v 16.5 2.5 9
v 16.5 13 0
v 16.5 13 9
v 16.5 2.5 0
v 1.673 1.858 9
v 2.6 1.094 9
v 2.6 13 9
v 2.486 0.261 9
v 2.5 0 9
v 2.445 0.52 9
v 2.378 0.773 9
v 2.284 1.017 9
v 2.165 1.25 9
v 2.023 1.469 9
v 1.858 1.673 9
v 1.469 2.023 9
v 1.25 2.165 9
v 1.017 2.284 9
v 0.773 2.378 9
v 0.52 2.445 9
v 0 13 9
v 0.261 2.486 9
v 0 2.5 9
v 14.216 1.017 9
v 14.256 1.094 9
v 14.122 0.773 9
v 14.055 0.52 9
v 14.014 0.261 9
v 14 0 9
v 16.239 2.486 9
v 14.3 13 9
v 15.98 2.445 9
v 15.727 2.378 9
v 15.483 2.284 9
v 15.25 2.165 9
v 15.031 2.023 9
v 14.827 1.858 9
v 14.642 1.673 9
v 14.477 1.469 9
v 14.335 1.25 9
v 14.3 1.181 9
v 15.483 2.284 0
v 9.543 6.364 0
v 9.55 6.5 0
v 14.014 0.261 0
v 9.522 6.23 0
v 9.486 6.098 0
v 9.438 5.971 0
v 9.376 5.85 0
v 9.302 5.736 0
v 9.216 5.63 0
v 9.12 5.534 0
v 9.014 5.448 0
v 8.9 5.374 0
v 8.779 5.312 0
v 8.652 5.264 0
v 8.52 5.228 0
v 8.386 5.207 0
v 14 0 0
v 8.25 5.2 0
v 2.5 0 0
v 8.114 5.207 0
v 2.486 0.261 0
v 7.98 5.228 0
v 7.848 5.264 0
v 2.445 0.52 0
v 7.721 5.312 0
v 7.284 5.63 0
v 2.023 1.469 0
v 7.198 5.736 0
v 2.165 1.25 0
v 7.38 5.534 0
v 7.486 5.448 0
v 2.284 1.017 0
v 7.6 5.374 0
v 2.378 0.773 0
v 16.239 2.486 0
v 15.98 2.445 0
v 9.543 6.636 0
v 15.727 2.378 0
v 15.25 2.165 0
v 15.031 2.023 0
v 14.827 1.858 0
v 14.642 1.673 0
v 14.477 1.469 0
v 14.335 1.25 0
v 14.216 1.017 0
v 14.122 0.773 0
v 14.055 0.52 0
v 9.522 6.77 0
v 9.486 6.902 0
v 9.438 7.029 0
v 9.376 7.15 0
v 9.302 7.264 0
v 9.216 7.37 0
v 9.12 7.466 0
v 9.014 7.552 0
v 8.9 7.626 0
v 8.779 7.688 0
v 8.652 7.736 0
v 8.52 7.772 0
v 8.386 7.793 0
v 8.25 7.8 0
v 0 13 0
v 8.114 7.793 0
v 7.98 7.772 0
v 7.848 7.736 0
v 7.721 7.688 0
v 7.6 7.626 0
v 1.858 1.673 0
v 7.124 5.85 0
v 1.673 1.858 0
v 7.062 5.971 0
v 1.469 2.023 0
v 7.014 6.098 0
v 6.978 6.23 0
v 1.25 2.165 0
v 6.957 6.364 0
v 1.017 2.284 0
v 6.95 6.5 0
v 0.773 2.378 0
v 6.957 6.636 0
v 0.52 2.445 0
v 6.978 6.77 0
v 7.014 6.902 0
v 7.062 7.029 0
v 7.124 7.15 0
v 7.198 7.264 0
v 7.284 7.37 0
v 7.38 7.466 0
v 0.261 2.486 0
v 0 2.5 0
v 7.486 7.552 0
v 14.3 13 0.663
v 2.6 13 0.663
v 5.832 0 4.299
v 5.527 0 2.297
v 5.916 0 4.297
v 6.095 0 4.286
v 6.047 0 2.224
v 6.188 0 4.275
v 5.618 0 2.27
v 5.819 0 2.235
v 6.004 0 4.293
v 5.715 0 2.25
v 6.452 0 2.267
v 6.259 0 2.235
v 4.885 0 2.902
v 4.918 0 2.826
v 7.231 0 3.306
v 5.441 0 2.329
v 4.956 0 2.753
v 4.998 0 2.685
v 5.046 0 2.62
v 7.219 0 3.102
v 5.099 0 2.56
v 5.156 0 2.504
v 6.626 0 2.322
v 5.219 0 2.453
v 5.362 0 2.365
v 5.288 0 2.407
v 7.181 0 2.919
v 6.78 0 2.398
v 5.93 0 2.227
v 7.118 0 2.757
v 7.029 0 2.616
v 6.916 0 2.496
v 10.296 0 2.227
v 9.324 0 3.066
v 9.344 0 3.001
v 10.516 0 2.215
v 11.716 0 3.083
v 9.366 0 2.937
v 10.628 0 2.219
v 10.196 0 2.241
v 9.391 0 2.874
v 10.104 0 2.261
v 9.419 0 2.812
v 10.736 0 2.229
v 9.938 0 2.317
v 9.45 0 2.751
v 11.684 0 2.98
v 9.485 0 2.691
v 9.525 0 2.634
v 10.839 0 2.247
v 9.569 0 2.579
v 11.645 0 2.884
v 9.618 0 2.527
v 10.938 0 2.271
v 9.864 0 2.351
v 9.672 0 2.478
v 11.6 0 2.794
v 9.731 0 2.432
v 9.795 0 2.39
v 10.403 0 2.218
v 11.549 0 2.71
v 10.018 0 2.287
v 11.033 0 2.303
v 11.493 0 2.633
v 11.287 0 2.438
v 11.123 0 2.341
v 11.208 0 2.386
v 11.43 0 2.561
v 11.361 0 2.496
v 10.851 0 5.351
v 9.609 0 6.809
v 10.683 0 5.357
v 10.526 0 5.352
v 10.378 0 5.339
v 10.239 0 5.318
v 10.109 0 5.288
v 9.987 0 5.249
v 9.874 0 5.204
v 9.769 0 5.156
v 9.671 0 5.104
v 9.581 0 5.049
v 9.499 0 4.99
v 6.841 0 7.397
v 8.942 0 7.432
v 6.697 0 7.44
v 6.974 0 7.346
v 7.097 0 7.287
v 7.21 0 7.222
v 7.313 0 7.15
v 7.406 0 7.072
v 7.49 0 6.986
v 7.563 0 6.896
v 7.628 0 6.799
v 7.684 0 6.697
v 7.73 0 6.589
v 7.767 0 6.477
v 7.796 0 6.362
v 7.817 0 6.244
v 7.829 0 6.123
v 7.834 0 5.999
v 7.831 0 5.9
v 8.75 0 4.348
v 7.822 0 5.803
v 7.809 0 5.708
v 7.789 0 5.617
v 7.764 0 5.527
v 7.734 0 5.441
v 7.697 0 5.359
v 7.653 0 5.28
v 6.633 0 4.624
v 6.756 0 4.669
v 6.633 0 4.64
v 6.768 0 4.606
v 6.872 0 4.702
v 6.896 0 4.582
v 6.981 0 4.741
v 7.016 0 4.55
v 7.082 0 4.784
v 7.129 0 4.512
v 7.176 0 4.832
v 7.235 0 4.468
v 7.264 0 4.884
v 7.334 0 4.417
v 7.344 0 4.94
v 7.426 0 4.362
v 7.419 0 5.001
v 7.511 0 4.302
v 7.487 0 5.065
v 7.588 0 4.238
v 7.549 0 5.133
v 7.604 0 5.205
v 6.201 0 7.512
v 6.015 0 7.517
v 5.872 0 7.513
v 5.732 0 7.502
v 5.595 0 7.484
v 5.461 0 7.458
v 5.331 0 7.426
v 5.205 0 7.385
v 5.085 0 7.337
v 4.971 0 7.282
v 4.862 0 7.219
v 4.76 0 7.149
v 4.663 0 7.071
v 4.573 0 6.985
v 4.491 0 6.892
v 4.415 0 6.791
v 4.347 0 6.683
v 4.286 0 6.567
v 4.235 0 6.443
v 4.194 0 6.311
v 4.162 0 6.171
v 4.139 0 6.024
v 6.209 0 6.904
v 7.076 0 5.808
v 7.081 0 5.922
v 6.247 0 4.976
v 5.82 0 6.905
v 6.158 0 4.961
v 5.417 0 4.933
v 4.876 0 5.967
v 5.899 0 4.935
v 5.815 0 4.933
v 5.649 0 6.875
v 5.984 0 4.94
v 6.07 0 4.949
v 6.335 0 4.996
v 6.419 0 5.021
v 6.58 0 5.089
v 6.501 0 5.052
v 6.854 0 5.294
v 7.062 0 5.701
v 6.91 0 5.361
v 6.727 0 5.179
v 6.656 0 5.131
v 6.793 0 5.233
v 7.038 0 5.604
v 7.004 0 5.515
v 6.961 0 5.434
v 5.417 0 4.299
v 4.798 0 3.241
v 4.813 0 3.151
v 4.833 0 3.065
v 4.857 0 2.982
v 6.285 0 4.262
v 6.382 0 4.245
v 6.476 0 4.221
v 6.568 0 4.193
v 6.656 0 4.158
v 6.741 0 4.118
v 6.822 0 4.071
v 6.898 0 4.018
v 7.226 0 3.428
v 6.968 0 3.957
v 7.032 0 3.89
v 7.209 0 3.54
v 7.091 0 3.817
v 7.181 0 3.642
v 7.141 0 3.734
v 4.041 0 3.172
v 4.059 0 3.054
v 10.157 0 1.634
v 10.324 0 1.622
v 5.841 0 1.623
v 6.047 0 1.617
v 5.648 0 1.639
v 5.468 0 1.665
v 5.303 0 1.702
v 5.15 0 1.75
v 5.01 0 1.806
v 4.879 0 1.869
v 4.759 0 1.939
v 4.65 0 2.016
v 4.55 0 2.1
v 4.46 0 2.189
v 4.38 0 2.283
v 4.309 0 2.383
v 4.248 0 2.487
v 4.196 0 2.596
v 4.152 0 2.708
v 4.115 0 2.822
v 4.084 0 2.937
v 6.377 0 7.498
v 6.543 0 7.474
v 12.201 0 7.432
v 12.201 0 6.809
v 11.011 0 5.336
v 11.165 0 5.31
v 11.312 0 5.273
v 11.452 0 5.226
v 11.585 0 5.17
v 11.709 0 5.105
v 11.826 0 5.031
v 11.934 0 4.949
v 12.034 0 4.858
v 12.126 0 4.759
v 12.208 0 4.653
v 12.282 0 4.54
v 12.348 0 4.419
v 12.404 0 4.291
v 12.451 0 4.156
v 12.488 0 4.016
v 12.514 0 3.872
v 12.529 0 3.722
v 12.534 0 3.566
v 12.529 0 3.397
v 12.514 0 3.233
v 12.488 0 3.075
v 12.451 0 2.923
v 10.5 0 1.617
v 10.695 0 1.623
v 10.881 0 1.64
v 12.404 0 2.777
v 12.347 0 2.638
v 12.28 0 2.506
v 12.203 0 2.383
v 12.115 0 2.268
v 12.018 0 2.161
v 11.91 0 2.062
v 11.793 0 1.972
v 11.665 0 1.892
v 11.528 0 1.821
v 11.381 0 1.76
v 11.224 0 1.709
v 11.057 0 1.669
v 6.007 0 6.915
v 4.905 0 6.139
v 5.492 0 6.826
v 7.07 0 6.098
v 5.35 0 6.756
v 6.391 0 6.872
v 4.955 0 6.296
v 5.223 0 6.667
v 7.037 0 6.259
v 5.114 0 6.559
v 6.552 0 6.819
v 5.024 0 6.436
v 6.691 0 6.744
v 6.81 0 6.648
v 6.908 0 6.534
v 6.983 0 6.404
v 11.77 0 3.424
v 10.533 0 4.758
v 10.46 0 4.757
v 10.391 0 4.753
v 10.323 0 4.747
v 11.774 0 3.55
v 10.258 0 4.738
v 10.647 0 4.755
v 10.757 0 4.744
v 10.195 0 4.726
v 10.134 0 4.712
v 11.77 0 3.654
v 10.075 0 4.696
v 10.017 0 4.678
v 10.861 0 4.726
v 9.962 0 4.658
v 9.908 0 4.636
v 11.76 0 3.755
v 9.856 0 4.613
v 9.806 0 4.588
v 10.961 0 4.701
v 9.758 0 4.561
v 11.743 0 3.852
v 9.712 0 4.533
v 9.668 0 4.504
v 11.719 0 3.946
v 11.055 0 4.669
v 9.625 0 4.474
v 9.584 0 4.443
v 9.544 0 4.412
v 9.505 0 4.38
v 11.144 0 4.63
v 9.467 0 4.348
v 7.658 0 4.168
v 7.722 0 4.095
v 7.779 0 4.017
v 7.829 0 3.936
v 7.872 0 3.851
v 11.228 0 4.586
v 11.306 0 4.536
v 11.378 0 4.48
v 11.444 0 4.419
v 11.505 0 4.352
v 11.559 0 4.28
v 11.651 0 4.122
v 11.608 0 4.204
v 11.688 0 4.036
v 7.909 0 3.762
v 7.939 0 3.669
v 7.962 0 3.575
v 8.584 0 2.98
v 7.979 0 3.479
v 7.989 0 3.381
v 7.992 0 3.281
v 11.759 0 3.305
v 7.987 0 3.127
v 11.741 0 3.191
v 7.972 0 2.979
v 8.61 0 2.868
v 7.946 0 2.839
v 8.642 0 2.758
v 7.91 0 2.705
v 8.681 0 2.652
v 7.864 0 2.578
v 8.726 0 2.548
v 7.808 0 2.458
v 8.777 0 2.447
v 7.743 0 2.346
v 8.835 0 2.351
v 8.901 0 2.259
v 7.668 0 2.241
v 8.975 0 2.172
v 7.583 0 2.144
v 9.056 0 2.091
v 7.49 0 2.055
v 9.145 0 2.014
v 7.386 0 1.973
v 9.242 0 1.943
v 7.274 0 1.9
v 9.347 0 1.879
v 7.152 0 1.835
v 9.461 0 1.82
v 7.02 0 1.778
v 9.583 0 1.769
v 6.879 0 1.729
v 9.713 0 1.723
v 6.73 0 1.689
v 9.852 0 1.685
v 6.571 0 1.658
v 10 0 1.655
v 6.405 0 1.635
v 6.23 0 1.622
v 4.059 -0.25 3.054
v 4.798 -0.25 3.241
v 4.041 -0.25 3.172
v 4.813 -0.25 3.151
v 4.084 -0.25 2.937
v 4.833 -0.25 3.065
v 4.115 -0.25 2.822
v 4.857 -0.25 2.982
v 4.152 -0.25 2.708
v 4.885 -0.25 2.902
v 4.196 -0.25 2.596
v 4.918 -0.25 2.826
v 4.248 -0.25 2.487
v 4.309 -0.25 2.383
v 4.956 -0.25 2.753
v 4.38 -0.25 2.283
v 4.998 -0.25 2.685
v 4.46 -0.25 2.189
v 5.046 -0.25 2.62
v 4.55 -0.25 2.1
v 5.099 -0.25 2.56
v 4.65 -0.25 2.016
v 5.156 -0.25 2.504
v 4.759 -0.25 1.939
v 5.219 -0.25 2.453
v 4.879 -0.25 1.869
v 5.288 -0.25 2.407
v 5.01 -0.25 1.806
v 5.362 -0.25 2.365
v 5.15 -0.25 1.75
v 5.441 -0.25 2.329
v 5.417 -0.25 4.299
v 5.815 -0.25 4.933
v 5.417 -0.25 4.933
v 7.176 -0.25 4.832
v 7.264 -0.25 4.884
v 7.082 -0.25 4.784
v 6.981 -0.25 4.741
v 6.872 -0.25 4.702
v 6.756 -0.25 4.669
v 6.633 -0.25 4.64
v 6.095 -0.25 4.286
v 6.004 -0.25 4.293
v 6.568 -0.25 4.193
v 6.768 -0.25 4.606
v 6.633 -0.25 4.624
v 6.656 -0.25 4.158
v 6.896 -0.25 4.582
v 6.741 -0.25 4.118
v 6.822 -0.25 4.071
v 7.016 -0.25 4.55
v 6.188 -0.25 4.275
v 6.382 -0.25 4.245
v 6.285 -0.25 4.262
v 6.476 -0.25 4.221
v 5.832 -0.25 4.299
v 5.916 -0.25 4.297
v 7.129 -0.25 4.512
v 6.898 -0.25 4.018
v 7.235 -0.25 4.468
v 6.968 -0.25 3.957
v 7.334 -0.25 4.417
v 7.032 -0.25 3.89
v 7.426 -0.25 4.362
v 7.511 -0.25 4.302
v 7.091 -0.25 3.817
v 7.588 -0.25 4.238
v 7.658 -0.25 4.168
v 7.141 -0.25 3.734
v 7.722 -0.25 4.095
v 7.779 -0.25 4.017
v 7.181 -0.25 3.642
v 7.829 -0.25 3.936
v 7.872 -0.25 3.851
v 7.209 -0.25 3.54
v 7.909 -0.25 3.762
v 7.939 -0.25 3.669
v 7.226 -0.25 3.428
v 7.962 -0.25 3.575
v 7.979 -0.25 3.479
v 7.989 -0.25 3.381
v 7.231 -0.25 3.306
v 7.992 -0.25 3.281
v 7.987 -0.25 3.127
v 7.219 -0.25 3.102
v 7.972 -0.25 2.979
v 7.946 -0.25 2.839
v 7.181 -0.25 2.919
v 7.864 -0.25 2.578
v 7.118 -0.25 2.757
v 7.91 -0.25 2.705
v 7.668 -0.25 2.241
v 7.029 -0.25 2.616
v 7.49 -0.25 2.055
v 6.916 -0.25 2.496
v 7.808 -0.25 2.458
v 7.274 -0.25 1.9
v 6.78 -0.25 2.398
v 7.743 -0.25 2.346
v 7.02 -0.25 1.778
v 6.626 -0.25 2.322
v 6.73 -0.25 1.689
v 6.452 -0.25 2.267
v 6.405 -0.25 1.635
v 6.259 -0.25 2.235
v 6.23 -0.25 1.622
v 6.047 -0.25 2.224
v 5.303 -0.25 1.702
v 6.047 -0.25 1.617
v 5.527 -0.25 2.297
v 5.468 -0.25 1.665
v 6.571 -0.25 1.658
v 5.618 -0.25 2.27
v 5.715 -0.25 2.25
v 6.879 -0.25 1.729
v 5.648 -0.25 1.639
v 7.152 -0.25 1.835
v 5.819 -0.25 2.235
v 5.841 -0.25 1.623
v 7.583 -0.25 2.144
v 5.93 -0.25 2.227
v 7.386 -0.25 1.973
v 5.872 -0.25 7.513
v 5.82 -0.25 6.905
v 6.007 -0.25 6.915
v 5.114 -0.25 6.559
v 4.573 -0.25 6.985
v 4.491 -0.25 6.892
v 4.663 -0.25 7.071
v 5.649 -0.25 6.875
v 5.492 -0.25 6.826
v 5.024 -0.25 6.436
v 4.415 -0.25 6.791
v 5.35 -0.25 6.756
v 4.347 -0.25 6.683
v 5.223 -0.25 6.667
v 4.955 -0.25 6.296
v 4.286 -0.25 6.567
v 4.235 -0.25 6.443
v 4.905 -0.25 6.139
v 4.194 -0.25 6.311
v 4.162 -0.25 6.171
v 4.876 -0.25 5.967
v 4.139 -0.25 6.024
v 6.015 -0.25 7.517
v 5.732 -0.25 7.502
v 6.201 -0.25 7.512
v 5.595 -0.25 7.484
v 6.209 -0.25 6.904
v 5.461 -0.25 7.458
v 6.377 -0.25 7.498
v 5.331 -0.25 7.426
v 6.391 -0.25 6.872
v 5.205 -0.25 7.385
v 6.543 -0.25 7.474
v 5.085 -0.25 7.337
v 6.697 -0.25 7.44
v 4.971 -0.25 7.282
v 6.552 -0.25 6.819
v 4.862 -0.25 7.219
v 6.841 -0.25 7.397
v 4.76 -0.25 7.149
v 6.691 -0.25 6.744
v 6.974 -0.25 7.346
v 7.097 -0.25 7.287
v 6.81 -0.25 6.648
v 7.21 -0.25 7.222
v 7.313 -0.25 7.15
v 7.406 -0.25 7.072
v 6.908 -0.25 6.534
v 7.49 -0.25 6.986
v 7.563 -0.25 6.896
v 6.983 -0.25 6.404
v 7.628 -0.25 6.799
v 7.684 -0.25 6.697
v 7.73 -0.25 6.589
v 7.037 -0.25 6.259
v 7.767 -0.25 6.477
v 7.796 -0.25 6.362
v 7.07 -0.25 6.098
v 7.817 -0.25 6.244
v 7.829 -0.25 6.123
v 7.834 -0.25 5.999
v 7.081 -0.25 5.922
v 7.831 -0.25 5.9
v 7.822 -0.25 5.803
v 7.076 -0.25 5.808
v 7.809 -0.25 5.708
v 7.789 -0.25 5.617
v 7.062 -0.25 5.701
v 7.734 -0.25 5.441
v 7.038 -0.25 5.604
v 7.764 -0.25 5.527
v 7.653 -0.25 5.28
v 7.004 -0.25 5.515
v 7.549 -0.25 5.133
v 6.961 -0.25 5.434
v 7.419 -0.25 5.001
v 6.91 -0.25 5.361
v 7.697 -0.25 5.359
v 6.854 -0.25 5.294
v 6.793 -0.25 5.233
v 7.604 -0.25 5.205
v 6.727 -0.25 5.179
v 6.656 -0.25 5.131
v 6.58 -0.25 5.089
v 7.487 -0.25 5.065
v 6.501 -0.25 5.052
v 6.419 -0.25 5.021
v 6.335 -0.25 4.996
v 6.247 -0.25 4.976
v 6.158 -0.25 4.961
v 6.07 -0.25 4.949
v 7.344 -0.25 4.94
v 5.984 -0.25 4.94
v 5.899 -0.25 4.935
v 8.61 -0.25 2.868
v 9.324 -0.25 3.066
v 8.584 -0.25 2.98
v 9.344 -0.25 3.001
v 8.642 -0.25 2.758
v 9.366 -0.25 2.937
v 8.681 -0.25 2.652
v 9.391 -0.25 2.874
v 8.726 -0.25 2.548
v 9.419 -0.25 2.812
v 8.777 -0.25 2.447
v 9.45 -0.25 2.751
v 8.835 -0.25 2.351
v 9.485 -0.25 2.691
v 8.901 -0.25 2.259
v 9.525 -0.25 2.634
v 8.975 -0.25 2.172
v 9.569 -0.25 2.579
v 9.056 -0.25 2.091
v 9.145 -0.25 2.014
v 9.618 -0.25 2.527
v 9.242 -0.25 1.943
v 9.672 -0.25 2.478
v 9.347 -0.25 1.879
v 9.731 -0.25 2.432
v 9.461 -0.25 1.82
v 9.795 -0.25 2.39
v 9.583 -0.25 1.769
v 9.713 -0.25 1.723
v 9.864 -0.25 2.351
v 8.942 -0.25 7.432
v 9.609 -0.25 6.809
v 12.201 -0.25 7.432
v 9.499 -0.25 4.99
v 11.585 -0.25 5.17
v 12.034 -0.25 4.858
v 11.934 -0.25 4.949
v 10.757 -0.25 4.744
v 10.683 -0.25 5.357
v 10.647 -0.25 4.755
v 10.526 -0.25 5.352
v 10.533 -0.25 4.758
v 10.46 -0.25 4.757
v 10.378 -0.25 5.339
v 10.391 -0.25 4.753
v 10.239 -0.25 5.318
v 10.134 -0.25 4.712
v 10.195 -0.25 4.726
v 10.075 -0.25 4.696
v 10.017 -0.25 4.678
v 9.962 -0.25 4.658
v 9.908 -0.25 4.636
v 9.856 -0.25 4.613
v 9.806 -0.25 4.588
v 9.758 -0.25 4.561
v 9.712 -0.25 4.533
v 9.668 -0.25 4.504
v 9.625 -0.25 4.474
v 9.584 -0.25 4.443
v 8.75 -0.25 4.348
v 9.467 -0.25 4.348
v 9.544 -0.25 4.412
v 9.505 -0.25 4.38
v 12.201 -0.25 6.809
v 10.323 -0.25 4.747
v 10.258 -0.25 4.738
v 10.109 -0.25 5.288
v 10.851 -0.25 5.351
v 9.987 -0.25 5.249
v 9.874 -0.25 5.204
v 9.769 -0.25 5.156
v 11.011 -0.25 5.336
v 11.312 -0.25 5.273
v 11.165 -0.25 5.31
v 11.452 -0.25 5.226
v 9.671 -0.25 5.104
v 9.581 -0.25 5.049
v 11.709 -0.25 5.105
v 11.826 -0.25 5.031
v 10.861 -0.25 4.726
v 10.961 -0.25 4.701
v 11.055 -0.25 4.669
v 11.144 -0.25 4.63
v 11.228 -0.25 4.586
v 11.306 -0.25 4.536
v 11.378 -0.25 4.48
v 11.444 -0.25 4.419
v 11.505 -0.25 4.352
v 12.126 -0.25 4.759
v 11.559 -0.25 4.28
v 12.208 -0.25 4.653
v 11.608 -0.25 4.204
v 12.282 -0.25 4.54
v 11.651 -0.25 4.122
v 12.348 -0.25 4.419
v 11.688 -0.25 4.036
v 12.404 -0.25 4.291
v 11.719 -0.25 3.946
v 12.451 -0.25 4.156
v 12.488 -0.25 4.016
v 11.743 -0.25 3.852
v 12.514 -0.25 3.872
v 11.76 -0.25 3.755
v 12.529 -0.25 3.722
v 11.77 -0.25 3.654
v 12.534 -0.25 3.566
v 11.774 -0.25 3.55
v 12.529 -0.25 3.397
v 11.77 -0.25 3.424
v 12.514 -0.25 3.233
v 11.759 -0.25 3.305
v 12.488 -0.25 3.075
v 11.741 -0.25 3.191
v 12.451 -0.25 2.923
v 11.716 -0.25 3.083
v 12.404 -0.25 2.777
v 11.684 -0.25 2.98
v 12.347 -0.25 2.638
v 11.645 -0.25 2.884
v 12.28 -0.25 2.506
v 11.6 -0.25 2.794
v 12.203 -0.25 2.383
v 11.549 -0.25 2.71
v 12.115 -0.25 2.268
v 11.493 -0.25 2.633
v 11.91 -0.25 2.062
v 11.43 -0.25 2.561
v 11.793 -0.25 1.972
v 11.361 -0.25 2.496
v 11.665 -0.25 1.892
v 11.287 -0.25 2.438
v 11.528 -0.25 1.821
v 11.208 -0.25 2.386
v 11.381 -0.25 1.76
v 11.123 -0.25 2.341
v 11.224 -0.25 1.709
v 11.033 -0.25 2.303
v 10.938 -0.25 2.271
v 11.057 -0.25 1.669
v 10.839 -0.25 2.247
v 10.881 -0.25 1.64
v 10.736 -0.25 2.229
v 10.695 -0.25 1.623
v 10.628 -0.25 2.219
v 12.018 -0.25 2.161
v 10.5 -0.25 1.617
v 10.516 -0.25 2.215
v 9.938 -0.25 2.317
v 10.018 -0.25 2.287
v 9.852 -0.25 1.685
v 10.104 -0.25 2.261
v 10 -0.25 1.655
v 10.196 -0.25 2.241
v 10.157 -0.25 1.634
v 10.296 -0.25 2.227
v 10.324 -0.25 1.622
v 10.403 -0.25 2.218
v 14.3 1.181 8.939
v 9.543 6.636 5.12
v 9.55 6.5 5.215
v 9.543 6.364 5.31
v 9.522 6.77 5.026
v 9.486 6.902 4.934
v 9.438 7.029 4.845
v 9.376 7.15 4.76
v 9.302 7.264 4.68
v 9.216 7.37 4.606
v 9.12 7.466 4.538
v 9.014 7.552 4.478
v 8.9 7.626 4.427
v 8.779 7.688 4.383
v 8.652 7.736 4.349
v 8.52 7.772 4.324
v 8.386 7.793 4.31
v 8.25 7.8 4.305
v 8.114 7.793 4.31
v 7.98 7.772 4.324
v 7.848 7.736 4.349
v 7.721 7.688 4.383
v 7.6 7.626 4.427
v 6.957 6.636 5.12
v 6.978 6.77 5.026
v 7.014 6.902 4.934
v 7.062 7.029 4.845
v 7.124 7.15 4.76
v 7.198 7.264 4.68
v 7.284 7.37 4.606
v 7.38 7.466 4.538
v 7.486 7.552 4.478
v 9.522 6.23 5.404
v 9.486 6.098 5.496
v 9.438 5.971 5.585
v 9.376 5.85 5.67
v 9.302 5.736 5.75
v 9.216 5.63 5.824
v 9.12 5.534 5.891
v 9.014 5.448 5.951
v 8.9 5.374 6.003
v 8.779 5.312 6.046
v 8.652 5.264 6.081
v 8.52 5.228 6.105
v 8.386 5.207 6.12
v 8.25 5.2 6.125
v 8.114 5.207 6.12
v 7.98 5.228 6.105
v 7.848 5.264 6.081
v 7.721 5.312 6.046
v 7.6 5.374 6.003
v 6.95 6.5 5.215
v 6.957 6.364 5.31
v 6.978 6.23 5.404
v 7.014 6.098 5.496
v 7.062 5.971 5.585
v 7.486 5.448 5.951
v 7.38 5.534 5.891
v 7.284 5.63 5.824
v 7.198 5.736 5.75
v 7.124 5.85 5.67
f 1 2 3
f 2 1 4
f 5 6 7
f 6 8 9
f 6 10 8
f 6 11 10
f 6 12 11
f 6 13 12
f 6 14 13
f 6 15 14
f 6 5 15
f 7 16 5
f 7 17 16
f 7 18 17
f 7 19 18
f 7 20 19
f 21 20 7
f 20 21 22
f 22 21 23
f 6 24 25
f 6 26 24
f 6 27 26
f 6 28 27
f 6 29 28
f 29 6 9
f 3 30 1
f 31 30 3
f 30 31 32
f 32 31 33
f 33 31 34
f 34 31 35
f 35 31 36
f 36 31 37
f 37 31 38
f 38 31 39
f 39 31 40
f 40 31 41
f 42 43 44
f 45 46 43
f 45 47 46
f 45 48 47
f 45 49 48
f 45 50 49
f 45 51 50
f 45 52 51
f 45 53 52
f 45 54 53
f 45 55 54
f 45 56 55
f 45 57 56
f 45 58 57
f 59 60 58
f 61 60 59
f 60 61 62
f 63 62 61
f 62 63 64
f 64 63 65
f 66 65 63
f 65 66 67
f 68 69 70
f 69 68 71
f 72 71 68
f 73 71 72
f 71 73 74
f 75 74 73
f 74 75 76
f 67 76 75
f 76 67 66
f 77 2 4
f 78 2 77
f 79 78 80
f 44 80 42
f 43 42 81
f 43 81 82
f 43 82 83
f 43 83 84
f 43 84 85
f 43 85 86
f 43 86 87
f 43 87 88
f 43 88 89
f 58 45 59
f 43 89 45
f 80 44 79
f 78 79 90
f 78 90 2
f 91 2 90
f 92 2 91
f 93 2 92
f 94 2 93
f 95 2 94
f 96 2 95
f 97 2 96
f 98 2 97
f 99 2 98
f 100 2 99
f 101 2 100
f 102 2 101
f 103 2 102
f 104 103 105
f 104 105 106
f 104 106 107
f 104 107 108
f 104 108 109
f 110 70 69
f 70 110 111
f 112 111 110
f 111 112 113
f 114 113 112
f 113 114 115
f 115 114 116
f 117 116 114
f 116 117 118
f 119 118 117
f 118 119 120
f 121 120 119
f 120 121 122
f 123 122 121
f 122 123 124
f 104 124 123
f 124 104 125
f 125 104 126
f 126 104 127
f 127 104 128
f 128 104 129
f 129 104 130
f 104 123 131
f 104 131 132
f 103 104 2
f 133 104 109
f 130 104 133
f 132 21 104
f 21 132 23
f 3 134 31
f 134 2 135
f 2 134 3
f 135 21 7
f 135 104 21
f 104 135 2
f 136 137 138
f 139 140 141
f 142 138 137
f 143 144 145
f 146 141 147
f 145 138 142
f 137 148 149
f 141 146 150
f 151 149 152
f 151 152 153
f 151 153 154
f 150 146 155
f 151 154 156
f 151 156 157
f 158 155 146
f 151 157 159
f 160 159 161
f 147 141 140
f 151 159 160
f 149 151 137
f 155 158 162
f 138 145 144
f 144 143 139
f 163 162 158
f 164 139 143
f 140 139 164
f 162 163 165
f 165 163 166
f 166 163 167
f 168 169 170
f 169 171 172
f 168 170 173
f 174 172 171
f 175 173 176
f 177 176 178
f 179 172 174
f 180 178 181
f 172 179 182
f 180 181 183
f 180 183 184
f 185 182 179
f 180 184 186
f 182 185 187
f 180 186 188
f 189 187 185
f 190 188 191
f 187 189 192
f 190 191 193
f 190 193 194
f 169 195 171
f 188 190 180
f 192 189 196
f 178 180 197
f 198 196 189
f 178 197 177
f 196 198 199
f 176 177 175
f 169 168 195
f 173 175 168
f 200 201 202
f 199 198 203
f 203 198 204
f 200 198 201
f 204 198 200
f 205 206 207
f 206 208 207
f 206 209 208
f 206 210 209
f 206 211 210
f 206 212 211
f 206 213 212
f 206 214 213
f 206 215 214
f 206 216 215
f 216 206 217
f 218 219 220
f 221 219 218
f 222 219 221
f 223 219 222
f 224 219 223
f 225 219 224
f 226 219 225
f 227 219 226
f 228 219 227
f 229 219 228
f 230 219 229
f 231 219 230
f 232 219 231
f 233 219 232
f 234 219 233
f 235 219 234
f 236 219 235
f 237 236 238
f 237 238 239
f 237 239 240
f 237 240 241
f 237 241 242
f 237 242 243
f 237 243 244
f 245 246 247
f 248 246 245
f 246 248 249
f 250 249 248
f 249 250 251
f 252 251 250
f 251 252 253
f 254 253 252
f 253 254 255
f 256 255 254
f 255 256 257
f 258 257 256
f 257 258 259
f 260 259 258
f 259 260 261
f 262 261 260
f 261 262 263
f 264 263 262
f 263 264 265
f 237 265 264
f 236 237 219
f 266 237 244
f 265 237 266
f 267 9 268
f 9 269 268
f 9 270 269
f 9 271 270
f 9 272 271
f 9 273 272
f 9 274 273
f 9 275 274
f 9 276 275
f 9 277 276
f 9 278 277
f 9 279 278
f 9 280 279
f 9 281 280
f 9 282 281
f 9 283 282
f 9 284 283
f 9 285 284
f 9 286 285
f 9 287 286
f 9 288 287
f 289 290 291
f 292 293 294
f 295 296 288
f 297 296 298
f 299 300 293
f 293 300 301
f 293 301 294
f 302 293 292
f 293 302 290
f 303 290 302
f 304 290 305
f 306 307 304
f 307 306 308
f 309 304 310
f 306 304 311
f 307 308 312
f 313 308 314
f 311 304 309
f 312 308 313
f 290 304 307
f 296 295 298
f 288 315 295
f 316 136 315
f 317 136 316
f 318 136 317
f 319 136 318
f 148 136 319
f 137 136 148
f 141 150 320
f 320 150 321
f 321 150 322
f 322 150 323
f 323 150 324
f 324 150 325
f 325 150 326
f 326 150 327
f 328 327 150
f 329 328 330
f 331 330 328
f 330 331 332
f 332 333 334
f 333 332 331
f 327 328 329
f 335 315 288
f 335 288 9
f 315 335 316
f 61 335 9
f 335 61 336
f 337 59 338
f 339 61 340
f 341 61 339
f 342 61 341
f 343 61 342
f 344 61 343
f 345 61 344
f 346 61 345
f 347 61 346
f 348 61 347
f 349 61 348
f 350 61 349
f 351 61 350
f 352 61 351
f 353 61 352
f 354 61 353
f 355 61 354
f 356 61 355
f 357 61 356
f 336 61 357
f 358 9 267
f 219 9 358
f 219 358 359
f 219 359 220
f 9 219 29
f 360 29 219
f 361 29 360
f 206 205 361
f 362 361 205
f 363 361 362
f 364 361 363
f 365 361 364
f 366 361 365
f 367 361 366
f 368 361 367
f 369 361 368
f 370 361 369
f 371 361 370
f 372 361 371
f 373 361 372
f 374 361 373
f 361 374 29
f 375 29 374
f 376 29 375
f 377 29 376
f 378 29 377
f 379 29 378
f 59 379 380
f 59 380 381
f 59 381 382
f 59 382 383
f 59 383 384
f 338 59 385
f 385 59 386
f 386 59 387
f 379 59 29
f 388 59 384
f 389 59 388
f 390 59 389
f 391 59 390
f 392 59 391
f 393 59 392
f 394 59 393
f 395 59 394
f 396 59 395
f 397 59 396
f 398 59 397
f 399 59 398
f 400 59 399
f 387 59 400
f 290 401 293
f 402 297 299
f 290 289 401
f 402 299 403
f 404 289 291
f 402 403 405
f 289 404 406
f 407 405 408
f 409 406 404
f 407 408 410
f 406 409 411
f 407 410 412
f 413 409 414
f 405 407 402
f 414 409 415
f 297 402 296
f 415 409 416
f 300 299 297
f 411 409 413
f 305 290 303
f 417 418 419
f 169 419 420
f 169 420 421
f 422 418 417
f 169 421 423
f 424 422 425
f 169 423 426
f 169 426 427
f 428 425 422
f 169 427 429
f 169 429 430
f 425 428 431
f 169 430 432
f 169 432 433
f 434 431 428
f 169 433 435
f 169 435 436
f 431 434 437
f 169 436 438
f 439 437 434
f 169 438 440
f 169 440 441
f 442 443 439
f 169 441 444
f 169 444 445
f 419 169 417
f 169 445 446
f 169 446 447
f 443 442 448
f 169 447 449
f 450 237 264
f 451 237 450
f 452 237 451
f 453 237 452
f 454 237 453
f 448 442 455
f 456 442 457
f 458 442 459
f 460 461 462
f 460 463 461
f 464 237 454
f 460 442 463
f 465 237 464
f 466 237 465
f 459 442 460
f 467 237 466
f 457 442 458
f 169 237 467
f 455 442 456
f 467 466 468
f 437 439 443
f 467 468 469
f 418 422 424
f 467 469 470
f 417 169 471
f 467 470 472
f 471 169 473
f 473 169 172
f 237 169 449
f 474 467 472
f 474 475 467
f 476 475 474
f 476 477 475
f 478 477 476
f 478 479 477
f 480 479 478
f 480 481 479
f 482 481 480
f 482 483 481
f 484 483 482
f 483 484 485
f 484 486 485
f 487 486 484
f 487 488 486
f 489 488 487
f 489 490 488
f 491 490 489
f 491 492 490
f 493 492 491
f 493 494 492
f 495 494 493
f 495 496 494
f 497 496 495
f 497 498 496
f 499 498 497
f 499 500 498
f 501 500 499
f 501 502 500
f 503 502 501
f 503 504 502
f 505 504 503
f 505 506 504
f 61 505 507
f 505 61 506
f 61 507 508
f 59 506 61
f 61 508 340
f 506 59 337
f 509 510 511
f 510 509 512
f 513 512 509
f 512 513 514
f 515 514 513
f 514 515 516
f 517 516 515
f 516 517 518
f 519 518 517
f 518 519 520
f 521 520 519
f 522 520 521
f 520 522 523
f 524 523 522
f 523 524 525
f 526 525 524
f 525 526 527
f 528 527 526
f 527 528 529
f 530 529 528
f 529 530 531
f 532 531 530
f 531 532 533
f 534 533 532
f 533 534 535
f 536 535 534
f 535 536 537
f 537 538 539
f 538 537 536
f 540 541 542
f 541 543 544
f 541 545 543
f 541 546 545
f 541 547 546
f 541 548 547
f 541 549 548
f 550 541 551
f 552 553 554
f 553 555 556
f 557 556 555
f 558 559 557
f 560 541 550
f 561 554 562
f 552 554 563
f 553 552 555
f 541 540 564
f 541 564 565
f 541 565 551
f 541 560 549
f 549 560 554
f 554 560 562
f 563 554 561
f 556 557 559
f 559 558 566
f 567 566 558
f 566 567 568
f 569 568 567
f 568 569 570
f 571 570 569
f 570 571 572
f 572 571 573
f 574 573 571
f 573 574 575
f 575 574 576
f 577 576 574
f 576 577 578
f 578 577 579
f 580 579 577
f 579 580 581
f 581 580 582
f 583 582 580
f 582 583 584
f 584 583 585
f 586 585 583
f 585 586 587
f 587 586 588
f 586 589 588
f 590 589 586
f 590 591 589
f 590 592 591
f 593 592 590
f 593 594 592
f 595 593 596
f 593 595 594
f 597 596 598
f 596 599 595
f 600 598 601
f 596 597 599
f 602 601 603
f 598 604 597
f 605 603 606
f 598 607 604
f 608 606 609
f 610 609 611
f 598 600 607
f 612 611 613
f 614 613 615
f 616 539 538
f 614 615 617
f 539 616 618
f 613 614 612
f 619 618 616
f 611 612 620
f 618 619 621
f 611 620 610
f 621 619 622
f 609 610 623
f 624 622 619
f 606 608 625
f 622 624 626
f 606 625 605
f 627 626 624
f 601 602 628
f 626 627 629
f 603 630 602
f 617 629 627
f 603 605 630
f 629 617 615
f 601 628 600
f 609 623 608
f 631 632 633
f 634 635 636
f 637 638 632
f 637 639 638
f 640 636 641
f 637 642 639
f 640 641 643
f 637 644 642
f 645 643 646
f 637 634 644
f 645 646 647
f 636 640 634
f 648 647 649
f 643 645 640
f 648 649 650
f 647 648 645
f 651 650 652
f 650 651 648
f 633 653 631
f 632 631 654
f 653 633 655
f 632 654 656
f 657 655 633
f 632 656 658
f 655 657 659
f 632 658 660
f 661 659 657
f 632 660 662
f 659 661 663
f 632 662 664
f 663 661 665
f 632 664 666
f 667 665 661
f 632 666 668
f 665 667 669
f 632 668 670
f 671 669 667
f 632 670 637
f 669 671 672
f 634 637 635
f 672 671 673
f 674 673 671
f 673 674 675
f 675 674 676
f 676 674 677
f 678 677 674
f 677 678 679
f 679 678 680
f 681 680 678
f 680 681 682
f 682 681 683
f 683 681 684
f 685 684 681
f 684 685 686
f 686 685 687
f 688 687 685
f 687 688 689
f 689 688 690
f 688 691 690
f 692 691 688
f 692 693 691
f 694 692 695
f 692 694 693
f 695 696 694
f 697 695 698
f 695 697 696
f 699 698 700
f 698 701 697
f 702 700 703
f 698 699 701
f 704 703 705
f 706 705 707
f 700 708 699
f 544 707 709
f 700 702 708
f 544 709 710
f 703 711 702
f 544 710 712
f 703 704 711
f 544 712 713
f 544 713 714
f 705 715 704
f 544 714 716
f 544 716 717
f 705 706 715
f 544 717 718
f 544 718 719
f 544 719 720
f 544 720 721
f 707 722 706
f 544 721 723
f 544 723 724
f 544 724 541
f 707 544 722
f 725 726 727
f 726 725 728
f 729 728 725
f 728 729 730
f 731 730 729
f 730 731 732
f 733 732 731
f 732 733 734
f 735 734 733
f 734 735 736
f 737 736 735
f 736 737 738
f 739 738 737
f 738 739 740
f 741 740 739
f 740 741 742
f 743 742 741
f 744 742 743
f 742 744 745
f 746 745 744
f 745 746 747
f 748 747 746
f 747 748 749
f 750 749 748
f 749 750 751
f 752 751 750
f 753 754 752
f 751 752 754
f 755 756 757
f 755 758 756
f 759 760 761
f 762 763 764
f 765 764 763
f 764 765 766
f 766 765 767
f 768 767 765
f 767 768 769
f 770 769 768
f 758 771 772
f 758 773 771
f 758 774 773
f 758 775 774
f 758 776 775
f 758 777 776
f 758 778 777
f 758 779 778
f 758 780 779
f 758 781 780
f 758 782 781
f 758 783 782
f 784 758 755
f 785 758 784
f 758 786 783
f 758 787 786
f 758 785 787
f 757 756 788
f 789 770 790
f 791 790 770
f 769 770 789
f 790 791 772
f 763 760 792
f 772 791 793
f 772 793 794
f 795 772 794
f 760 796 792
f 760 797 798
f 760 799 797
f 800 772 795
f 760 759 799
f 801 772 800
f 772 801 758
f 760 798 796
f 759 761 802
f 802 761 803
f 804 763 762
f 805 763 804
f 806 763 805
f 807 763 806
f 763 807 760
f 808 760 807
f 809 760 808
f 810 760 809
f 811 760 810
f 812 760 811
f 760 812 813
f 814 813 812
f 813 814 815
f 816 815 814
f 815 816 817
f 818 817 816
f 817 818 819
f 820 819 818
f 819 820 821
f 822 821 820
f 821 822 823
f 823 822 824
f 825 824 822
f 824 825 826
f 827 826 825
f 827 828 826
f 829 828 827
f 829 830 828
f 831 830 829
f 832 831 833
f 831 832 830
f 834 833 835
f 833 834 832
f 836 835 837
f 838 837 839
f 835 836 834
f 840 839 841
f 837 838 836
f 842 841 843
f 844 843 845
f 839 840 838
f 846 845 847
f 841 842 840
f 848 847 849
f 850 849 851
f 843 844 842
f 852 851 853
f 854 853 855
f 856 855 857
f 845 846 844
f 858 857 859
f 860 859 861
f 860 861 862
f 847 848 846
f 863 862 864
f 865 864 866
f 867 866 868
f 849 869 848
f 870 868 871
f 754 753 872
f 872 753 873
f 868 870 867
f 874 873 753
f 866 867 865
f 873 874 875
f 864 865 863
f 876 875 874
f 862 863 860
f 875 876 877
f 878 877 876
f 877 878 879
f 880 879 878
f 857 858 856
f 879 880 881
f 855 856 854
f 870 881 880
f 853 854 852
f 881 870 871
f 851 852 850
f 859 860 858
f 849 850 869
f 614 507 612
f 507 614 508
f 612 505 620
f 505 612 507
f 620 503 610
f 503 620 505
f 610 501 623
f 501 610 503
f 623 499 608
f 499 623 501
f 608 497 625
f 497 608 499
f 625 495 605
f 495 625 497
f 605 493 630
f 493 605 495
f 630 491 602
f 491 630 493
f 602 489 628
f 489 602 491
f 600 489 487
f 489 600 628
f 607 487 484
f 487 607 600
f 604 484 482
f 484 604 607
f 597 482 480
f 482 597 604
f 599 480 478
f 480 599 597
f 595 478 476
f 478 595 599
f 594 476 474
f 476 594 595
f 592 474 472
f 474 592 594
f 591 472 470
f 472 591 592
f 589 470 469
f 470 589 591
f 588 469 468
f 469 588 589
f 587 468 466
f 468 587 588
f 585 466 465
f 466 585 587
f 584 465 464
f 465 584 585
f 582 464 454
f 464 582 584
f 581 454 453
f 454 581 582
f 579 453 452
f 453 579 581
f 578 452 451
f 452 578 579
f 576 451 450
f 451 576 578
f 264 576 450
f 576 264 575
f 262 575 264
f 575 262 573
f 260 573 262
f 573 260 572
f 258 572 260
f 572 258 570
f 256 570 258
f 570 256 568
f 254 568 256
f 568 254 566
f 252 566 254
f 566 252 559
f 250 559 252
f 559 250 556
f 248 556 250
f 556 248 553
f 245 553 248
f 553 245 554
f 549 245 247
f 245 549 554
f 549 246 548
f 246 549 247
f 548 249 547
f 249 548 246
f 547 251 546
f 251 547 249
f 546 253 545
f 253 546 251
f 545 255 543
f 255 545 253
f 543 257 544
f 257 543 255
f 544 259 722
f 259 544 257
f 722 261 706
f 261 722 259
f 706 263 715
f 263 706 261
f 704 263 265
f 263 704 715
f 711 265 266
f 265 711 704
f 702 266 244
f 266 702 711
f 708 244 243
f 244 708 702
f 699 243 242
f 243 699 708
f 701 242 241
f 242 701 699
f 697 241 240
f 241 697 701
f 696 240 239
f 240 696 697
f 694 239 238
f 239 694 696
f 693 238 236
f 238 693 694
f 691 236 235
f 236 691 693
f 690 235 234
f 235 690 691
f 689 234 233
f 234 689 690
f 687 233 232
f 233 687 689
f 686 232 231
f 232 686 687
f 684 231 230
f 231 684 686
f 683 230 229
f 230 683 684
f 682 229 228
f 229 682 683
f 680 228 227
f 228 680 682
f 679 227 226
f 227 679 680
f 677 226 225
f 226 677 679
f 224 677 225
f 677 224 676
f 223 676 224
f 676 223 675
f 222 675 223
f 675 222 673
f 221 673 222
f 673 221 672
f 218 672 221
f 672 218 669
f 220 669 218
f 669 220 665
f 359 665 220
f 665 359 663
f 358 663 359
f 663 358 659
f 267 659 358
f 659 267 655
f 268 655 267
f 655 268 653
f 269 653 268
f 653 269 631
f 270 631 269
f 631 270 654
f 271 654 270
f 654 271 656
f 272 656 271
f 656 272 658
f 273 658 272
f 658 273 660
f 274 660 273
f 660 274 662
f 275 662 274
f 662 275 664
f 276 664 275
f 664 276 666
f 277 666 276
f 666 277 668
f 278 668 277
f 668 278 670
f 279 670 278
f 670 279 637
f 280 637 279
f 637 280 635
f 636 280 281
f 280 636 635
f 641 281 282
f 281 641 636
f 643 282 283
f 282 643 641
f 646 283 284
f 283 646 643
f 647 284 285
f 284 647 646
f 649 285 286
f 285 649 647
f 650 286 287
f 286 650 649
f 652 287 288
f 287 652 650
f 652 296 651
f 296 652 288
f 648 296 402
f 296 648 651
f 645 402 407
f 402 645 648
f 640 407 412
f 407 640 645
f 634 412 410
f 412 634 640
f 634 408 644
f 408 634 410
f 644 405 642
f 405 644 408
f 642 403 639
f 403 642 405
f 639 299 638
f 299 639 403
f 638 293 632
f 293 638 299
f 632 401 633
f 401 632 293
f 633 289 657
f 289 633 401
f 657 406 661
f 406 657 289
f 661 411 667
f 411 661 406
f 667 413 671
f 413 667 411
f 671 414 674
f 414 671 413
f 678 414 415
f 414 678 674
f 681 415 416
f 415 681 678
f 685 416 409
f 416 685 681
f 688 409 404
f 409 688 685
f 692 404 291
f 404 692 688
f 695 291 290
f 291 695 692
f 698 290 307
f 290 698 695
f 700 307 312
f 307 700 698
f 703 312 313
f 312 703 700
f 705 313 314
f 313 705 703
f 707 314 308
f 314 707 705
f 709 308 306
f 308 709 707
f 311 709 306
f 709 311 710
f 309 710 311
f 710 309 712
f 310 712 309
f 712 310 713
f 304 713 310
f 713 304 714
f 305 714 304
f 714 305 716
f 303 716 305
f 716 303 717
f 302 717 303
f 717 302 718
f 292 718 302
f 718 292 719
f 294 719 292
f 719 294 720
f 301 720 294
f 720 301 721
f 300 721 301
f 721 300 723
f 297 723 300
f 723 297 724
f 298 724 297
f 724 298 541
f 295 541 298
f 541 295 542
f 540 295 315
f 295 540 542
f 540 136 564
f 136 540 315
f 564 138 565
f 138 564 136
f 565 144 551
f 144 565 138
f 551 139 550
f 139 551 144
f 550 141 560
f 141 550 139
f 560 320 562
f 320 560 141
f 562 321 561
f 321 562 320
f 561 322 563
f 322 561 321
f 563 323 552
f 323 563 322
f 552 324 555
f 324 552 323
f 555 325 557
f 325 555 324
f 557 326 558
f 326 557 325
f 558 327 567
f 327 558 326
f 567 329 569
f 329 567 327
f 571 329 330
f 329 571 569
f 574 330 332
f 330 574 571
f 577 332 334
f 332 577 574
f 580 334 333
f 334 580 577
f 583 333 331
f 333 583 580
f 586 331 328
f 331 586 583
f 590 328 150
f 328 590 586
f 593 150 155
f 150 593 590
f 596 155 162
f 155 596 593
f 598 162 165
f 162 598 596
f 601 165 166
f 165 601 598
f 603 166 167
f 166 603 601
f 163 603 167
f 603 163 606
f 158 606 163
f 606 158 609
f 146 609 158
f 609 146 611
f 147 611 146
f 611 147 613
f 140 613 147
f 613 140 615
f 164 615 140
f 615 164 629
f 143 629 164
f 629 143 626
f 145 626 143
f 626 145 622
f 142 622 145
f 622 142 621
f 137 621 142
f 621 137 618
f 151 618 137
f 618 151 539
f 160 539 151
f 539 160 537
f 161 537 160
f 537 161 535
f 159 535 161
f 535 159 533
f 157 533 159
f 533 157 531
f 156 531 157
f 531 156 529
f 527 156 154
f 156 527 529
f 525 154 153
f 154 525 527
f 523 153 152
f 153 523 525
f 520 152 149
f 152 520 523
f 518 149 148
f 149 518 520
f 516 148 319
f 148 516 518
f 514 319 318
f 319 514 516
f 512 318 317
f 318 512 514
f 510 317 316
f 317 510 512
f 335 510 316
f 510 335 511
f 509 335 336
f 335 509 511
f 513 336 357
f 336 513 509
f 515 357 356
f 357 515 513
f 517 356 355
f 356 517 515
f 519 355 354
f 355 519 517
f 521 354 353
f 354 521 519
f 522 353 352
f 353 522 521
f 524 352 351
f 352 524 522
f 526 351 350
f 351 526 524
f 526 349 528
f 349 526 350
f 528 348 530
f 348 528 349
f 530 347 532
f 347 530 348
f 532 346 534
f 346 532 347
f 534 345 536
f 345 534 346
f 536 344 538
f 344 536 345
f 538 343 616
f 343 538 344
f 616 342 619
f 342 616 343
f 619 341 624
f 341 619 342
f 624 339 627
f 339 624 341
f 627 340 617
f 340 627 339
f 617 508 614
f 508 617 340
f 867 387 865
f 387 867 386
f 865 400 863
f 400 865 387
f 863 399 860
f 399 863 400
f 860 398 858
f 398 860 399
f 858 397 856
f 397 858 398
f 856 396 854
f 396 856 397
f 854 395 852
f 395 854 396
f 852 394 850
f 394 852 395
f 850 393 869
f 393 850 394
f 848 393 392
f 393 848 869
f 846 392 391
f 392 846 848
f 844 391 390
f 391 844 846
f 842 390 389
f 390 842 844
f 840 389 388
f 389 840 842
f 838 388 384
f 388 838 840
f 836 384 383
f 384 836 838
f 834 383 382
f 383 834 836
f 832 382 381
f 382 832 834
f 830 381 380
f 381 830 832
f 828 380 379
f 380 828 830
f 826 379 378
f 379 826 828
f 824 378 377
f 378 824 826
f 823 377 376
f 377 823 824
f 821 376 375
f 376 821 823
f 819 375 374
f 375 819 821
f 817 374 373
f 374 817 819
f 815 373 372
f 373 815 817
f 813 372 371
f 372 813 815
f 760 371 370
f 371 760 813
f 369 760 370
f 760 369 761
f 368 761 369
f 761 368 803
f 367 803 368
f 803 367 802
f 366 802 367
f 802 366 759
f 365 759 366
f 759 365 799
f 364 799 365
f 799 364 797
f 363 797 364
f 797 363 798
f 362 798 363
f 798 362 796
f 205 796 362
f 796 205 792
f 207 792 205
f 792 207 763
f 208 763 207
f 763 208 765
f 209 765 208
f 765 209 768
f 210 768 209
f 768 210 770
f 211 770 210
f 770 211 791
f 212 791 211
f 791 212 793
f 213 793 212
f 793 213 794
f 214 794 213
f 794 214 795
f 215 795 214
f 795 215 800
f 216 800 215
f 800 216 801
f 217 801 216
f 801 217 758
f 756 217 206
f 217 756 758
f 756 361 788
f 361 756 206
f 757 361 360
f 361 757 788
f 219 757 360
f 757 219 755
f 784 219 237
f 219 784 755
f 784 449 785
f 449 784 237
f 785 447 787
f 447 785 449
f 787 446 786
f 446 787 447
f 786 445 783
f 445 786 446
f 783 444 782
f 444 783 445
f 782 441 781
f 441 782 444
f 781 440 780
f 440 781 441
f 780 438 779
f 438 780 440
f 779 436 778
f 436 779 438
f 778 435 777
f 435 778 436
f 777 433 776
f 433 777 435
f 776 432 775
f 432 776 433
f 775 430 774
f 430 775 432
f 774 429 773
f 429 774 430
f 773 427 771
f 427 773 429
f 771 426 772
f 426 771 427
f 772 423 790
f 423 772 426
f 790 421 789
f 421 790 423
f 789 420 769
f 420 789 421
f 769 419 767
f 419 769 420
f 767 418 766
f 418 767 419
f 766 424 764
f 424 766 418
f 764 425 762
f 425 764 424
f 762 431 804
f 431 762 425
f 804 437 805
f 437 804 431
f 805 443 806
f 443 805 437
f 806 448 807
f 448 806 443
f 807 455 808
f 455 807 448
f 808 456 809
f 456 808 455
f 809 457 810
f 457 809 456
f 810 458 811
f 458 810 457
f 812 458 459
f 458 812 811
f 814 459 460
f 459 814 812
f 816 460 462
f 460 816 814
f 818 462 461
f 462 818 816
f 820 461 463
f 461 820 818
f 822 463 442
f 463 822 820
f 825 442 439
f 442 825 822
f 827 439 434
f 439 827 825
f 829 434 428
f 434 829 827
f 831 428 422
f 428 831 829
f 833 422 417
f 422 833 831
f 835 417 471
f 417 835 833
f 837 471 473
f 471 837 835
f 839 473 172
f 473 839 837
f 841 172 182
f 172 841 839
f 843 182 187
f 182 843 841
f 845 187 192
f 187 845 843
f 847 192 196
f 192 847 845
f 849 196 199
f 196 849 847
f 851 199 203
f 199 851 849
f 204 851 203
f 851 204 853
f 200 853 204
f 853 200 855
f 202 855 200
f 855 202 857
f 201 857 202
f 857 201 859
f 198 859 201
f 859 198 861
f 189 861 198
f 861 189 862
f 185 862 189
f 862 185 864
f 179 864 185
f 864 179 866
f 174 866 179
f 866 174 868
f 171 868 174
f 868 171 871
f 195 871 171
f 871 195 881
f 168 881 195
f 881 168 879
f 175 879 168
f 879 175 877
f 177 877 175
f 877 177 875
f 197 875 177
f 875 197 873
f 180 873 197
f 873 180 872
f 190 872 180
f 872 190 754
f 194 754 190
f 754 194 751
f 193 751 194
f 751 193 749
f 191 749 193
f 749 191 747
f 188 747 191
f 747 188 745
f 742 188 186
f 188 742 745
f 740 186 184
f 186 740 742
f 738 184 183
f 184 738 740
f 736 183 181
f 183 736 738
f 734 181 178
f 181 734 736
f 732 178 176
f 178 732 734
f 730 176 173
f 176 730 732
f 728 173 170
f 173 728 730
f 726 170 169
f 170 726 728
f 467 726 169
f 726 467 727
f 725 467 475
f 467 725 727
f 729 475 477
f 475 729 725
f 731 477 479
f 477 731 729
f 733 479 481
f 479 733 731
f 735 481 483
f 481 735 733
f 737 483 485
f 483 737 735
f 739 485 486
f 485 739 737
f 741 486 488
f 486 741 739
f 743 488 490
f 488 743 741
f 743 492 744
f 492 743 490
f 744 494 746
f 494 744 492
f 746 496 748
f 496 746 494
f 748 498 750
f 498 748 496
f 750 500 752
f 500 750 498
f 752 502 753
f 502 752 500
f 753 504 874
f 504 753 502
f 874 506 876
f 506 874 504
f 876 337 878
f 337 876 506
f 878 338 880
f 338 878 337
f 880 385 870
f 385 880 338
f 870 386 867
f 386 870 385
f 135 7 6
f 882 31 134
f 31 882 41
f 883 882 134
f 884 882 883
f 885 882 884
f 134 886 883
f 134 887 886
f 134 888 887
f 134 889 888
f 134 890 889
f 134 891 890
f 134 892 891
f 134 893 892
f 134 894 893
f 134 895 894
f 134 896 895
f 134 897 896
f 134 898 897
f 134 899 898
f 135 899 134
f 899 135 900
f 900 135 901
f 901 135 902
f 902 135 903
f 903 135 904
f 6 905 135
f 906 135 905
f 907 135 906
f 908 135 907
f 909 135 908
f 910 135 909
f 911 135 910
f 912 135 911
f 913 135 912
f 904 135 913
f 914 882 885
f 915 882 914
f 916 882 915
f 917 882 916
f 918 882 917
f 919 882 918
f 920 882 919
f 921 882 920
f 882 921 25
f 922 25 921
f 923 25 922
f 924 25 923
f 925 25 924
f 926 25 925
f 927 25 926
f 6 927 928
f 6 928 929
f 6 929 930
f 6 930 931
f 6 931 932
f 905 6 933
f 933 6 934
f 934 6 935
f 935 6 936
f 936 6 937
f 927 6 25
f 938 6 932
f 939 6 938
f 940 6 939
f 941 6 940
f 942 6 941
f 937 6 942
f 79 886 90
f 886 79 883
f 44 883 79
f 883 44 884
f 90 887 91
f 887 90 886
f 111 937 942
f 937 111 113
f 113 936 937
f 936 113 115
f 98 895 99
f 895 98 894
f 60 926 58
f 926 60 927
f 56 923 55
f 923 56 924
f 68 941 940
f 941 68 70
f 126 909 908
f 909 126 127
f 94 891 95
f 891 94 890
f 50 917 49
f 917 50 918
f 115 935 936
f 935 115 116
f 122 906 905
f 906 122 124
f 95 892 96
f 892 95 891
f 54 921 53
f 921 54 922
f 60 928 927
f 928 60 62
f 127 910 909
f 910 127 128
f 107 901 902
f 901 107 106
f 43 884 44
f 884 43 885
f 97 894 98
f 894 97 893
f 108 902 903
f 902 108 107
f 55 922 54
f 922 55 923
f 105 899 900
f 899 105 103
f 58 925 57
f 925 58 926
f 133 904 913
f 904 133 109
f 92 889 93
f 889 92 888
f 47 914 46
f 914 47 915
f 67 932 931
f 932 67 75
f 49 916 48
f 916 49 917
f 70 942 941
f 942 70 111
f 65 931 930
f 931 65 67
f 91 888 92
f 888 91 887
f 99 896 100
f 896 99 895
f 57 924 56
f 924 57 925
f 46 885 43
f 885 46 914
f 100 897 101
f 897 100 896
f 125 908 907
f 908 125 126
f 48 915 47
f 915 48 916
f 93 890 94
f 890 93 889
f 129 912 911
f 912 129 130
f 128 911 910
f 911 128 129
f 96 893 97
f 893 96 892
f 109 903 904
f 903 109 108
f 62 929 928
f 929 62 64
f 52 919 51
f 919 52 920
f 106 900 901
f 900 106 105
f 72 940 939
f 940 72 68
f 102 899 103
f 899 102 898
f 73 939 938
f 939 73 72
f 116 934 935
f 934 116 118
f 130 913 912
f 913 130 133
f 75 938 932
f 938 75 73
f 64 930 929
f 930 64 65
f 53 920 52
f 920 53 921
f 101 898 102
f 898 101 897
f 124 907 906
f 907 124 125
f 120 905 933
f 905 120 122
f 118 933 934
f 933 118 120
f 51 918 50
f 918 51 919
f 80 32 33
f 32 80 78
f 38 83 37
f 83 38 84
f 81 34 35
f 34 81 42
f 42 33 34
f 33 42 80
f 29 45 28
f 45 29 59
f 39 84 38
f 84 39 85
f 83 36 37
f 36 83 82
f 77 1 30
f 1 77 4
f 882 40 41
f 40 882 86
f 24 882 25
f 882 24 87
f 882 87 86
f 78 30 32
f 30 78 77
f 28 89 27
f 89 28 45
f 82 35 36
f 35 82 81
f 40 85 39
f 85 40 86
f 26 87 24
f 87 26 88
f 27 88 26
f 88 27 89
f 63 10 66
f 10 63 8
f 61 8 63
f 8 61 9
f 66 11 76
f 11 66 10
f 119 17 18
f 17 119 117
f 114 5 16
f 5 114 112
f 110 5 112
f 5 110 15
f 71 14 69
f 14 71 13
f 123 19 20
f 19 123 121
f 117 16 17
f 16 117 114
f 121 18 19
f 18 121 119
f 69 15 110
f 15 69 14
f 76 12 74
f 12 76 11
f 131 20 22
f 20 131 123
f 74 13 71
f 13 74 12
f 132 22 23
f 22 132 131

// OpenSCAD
// customizer

//CUSTOMIZER VARIABLES

// The width of the mount - recommend 16.5
mount_width=16.5; // [15,15.5,16,16.5,17,17.5]

// longitudinal length of the mount - recommend 13
mount_length=13; // [12,13,14,15,16]

// height of the mount - recommend 9
mount_height=9; // [8,9,10,11,12,13]

// angle of the camera - recommend 10-35
angle_mount=35;  // [0:60]

// measured width of your camera's body - for example: 11.3 for XAT520
camera_width=11.3; // [11,11.1,11.2,11.3,11.4,11.5,11.6,11.7,11.8,11.9,12]

// height of angle numbers on front - recommend .25
letter_height=.25;  // [.15,.25,.35,.45]

// size of angle numbers - recommend 1.5
letter_size=mount_height/1.5;  // [1,1.25,1.5,1.75,2]


//font = "Liberation Sans";

//if must fit between posts, recommend 2.5.  0 will eliminate the cutout
post_radius=2.5;  // [0,1,1.5,2,2.5,3,3.5]

// adjustment to height of camera setting - recommend 8
height_adjustment=8;  // [7,7.5,8,8.5,9,9.5]

/*hidden*/

camera_length=40*1;

wall_thickness=(mount_width-camera_width)/2; 

module letter(msg){
	linear_extrude(height = letter_height) {
	text(str(angle_mount), size = letter_size, halign = "center", valign = "center", $fn = 32);
	}
} 

module mount(){// basic mount cube and the letters, from which "cutouts" will be made
cube ([mount_width, mount_length, mount_height]);
    color("black")
    translate([mount_width/2, 0, mount_height/2]) rotate([90, 0, 0]) letter(str(angle_mount));
}

module tube(){  //this is the camera body to cut out from mount
cube ([camera_width+.4, 11.3, camera_length]); //accounts for extruder width of.4mm to size actual measurement for fit

}
module hole(){  // mounting hole... you may change the diameter/radius to fit your bolt/screw
    cylinder($fa=5, $fn=60, $fs=1, r1=1.3,r2=1.3,45);
}

module post(){  // some micros have posts between horizontal bodies which may interfere with mounting, if so this "notches" the mount to allow it to slide forward for mounting between the posts.
    cylinder($fn=60,r1=post_radius,r2=post_radius,45);
}

difference(){
mount();
rotate([90-angle_mount,0,0])
translate([wall_thickness,height_adjustment,-(camera_length/2)-mount_height]){tube();}
translate([mount_width/2,mount_length/2,-15]){hole();}
translate([mount_width,0,-15]){post();}
translate([0,0,-15]){post();}
}


